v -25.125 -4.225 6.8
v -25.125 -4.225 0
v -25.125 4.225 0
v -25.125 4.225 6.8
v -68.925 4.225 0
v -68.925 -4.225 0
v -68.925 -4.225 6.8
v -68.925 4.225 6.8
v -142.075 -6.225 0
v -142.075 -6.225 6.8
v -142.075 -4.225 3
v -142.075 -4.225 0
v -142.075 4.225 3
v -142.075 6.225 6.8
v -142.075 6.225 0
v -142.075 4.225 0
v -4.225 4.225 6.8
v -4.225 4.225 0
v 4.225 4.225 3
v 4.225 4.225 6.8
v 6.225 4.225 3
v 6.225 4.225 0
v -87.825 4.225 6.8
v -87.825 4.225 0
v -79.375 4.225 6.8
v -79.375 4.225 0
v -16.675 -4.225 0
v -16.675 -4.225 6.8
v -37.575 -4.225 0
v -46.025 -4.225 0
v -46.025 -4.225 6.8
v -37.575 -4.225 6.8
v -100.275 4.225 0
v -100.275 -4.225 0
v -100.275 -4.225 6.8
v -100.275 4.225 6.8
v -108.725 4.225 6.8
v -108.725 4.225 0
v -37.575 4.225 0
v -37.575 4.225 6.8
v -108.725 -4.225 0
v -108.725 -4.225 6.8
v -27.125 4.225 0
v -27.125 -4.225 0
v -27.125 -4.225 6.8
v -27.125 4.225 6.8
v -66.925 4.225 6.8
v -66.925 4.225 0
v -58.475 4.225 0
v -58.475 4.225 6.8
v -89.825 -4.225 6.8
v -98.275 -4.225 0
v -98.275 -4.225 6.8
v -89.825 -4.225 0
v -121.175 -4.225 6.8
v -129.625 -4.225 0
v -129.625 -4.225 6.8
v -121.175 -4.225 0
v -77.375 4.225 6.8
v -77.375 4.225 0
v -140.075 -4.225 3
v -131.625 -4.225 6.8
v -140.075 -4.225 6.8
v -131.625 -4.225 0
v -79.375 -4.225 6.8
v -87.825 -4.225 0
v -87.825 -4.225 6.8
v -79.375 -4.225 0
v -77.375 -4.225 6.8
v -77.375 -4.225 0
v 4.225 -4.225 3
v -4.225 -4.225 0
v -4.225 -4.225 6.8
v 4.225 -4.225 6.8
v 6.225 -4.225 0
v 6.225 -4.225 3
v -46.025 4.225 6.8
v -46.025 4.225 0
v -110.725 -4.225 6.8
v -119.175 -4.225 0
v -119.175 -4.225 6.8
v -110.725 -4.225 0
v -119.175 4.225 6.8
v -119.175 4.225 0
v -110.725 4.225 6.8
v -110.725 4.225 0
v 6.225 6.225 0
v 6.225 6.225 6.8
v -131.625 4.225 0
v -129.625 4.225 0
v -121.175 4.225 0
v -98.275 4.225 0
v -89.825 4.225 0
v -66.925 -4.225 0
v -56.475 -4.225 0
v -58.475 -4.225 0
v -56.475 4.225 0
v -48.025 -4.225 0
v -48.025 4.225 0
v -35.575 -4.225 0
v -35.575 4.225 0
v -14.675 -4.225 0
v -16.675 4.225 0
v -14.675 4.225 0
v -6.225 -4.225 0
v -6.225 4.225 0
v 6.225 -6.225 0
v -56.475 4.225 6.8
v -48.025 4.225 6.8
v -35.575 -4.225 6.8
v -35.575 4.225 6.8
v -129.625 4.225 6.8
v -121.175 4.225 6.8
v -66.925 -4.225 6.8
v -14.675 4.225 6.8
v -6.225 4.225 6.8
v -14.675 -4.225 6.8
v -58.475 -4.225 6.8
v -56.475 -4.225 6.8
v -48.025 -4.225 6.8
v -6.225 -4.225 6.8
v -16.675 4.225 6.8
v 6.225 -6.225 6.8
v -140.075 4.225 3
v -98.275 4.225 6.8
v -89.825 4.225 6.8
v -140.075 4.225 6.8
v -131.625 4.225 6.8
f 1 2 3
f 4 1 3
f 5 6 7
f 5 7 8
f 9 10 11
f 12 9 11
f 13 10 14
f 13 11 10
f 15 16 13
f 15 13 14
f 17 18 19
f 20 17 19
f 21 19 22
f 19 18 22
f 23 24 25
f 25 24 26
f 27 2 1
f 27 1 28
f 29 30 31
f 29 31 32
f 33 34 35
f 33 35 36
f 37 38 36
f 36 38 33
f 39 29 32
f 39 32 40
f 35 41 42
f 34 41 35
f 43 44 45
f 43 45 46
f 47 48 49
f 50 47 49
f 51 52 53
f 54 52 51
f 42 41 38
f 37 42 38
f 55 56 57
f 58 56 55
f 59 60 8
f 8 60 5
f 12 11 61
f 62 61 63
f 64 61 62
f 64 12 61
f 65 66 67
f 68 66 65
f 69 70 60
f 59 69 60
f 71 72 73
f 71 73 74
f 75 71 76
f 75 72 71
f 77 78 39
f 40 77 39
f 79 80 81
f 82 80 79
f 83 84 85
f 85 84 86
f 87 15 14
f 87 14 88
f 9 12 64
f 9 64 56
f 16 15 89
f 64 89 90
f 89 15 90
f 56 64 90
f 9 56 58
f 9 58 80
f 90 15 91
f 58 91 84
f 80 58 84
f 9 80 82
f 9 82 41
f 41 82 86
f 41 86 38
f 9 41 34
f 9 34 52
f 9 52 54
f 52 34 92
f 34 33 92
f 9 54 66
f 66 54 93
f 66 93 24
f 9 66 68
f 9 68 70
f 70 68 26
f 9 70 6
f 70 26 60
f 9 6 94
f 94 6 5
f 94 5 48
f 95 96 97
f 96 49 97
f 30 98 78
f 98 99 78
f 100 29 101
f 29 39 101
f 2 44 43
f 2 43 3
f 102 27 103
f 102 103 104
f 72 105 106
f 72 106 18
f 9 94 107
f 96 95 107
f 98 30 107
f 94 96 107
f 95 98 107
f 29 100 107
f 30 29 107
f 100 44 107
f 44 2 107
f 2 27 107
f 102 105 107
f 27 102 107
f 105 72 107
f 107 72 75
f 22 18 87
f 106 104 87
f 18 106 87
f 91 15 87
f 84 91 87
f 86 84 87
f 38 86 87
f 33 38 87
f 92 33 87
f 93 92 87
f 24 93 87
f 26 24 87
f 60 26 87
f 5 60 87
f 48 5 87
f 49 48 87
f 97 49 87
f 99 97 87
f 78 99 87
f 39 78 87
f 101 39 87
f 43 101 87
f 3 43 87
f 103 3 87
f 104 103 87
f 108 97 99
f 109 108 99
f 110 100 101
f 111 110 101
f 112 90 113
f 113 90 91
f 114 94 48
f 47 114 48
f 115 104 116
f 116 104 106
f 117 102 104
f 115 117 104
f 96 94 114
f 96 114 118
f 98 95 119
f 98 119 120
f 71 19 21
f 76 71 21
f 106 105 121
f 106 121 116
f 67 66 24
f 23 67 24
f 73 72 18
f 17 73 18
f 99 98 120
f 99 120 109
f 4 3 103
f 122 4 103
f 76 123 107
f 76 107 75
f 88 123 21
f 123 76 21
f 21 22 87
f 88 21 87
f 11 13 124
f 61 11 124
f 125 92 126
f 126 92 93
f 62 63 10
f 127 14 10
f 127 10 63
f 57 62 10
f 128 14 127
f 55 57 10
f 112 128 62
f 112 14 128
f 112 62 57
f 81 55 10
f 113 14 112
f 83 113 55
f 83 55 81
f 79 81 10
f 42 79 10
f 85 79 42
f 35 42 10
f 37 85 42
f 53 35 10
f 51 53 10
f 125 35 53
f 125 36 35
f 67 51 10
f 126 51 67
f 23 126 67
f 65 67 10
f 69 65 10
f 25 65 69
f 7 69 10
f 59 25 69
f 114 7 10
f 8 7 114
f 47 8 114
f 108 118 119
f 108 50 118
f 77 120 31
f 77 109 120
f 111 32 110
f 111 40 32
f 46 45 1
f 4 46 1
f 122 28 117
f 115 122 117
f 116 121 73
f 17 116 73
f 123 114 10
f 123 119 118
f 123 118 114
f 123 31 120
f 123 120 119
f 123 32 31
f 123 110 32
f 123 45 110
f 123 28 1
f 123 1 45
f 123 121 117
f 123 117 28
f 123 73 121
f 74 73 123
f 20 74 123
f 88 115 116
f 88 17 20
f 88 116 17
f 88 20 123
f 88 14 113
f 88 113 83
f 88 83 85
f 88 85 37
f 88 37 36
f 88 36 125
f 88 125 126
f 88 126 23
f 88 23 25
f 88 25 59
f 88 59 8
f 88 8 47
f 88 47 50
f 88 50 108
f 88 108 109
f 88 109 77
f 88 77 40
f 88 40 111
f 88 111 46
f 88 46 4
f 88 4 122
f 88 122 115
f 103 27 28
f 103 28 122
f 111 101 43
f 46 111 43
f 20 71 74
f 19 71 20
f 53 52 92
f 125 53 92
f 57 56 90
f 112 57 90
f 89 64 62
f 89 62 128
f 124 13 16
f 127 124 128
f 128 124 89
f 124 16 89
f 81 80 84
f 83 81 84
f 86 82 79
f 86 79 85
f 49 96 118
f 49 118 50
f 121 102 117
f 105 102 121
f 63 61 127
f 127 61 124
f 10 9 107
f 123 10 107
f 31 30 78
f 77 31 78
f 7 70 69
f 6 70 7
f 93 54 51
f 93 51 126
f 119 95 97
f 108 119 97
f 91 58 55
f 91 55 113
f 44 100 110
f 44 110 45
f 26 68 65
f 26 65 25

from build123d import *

# Parameters (mm, degrees)
SKETCH001_W      = 8.45
SKETCH001_H      = 8.45
EXTRUDE001_DEPTH = 3
SKETCH_W         = 148.3
SKETCH_H         = 12.45
SKETCH_W_2       = 8.45
SKETCH_H_2       = 8.45
EXTRUDE_DEPTH    = 6.8


with BuildPart() as extrude001:
    # Sketch001 → Extrude001 (new body)
    with BuildSketch(Plane.XY):
        with Locations((-142.725, 0)):
            Rectangle(SKETCH001_W, SKETCH001_H)
        with Locations((7.5, 0)):
            Rectangle(SKETCH001_W, SKETCH001_H)
    extrude(amount=EXTRUDE001_DEPTH)


with BuildPart() as cut:
    # Sketch → Extrude (new body)
    with BuildSketch(Plane.XY):
        with Locations((-67.925, 0)):
            Rectangle(SKETCH_W, SKETCH_H)
        Rectangle(SKETCH_W_2, SKETCH_H_2, mode=Mode.SUBTRACT)
        with Locations((-10.45, 0)):
            Rectangle(SKETCH_W_2, SKETCH_H_2, mode=Mode.SUBTRACT)
        with Locations((-20.9, 0)):
            Rectangle(SKETCH_W_2, SKETCH_H_2, mode=Mode.SUBTRACT)
        with Locations((-31.35, 0)):
            Rectangle(SKETCH_W_2, SKETCH_H_2, mode=Mode.SUBTRACT)
        with Locations((-41.8, 0)):
            Rectangle(SKETCH_W_2, SKETCH_H_2, mode=Mode.SUBTRACT)
        with Locations((-52.25, 0)):
            Rectangle(SKETCH_W_2, SKETCH_H_2, mode=Mode.SUBTRACT)
        with Locations((-62.7, 0)):
            Rectangle(SKETCH_W_2, SKETCH_H_2, mode=Mode.SUBTRACT)
        with Locations((-73.15, 0)):
            Rectangle(SKETCH_W_2, SKETCH_H_2, mode=Mode.SUBTRACT)
        with Locations((-83.6, 0)):
            Rectangle(SKETCH_W_2, SKETCH_H_2, mode=Mode.SUBTRACT)
        with Locations((-94.05, 0)):
            Rectangle(SKETCH_W_2, SKETCH_H_2, mode=Mode.SUBTRACT)
        with Locations((-104.5, 0)):
            Rectangle(SKETCH_W_2, SKETCH_H_2, mode=Mode.SUBTRACT)
        with Locations((-114.95, 0)):
            Rectangle(SKETCH_W_2, SKETCH_H_2, mode=Mode.SUBTRACT)
        with Locations((-125.4, 0)):
            Rectangle(SKETCH_W_2, SKETCH_H_2, mode=Mode.SUBTRACT)
        with Locations((-135.85, 0)):
            Rectangle(SKETCH_W_2, SKETCH_H_2, mode=Mode.SUBTRACT)
    extrude(amount=EXTRUDE_DEPTH)

    # Cut: cut Extrude001
    add(extrude001.part, mode=Mode.SUBTRACT)


solid = cut.part
